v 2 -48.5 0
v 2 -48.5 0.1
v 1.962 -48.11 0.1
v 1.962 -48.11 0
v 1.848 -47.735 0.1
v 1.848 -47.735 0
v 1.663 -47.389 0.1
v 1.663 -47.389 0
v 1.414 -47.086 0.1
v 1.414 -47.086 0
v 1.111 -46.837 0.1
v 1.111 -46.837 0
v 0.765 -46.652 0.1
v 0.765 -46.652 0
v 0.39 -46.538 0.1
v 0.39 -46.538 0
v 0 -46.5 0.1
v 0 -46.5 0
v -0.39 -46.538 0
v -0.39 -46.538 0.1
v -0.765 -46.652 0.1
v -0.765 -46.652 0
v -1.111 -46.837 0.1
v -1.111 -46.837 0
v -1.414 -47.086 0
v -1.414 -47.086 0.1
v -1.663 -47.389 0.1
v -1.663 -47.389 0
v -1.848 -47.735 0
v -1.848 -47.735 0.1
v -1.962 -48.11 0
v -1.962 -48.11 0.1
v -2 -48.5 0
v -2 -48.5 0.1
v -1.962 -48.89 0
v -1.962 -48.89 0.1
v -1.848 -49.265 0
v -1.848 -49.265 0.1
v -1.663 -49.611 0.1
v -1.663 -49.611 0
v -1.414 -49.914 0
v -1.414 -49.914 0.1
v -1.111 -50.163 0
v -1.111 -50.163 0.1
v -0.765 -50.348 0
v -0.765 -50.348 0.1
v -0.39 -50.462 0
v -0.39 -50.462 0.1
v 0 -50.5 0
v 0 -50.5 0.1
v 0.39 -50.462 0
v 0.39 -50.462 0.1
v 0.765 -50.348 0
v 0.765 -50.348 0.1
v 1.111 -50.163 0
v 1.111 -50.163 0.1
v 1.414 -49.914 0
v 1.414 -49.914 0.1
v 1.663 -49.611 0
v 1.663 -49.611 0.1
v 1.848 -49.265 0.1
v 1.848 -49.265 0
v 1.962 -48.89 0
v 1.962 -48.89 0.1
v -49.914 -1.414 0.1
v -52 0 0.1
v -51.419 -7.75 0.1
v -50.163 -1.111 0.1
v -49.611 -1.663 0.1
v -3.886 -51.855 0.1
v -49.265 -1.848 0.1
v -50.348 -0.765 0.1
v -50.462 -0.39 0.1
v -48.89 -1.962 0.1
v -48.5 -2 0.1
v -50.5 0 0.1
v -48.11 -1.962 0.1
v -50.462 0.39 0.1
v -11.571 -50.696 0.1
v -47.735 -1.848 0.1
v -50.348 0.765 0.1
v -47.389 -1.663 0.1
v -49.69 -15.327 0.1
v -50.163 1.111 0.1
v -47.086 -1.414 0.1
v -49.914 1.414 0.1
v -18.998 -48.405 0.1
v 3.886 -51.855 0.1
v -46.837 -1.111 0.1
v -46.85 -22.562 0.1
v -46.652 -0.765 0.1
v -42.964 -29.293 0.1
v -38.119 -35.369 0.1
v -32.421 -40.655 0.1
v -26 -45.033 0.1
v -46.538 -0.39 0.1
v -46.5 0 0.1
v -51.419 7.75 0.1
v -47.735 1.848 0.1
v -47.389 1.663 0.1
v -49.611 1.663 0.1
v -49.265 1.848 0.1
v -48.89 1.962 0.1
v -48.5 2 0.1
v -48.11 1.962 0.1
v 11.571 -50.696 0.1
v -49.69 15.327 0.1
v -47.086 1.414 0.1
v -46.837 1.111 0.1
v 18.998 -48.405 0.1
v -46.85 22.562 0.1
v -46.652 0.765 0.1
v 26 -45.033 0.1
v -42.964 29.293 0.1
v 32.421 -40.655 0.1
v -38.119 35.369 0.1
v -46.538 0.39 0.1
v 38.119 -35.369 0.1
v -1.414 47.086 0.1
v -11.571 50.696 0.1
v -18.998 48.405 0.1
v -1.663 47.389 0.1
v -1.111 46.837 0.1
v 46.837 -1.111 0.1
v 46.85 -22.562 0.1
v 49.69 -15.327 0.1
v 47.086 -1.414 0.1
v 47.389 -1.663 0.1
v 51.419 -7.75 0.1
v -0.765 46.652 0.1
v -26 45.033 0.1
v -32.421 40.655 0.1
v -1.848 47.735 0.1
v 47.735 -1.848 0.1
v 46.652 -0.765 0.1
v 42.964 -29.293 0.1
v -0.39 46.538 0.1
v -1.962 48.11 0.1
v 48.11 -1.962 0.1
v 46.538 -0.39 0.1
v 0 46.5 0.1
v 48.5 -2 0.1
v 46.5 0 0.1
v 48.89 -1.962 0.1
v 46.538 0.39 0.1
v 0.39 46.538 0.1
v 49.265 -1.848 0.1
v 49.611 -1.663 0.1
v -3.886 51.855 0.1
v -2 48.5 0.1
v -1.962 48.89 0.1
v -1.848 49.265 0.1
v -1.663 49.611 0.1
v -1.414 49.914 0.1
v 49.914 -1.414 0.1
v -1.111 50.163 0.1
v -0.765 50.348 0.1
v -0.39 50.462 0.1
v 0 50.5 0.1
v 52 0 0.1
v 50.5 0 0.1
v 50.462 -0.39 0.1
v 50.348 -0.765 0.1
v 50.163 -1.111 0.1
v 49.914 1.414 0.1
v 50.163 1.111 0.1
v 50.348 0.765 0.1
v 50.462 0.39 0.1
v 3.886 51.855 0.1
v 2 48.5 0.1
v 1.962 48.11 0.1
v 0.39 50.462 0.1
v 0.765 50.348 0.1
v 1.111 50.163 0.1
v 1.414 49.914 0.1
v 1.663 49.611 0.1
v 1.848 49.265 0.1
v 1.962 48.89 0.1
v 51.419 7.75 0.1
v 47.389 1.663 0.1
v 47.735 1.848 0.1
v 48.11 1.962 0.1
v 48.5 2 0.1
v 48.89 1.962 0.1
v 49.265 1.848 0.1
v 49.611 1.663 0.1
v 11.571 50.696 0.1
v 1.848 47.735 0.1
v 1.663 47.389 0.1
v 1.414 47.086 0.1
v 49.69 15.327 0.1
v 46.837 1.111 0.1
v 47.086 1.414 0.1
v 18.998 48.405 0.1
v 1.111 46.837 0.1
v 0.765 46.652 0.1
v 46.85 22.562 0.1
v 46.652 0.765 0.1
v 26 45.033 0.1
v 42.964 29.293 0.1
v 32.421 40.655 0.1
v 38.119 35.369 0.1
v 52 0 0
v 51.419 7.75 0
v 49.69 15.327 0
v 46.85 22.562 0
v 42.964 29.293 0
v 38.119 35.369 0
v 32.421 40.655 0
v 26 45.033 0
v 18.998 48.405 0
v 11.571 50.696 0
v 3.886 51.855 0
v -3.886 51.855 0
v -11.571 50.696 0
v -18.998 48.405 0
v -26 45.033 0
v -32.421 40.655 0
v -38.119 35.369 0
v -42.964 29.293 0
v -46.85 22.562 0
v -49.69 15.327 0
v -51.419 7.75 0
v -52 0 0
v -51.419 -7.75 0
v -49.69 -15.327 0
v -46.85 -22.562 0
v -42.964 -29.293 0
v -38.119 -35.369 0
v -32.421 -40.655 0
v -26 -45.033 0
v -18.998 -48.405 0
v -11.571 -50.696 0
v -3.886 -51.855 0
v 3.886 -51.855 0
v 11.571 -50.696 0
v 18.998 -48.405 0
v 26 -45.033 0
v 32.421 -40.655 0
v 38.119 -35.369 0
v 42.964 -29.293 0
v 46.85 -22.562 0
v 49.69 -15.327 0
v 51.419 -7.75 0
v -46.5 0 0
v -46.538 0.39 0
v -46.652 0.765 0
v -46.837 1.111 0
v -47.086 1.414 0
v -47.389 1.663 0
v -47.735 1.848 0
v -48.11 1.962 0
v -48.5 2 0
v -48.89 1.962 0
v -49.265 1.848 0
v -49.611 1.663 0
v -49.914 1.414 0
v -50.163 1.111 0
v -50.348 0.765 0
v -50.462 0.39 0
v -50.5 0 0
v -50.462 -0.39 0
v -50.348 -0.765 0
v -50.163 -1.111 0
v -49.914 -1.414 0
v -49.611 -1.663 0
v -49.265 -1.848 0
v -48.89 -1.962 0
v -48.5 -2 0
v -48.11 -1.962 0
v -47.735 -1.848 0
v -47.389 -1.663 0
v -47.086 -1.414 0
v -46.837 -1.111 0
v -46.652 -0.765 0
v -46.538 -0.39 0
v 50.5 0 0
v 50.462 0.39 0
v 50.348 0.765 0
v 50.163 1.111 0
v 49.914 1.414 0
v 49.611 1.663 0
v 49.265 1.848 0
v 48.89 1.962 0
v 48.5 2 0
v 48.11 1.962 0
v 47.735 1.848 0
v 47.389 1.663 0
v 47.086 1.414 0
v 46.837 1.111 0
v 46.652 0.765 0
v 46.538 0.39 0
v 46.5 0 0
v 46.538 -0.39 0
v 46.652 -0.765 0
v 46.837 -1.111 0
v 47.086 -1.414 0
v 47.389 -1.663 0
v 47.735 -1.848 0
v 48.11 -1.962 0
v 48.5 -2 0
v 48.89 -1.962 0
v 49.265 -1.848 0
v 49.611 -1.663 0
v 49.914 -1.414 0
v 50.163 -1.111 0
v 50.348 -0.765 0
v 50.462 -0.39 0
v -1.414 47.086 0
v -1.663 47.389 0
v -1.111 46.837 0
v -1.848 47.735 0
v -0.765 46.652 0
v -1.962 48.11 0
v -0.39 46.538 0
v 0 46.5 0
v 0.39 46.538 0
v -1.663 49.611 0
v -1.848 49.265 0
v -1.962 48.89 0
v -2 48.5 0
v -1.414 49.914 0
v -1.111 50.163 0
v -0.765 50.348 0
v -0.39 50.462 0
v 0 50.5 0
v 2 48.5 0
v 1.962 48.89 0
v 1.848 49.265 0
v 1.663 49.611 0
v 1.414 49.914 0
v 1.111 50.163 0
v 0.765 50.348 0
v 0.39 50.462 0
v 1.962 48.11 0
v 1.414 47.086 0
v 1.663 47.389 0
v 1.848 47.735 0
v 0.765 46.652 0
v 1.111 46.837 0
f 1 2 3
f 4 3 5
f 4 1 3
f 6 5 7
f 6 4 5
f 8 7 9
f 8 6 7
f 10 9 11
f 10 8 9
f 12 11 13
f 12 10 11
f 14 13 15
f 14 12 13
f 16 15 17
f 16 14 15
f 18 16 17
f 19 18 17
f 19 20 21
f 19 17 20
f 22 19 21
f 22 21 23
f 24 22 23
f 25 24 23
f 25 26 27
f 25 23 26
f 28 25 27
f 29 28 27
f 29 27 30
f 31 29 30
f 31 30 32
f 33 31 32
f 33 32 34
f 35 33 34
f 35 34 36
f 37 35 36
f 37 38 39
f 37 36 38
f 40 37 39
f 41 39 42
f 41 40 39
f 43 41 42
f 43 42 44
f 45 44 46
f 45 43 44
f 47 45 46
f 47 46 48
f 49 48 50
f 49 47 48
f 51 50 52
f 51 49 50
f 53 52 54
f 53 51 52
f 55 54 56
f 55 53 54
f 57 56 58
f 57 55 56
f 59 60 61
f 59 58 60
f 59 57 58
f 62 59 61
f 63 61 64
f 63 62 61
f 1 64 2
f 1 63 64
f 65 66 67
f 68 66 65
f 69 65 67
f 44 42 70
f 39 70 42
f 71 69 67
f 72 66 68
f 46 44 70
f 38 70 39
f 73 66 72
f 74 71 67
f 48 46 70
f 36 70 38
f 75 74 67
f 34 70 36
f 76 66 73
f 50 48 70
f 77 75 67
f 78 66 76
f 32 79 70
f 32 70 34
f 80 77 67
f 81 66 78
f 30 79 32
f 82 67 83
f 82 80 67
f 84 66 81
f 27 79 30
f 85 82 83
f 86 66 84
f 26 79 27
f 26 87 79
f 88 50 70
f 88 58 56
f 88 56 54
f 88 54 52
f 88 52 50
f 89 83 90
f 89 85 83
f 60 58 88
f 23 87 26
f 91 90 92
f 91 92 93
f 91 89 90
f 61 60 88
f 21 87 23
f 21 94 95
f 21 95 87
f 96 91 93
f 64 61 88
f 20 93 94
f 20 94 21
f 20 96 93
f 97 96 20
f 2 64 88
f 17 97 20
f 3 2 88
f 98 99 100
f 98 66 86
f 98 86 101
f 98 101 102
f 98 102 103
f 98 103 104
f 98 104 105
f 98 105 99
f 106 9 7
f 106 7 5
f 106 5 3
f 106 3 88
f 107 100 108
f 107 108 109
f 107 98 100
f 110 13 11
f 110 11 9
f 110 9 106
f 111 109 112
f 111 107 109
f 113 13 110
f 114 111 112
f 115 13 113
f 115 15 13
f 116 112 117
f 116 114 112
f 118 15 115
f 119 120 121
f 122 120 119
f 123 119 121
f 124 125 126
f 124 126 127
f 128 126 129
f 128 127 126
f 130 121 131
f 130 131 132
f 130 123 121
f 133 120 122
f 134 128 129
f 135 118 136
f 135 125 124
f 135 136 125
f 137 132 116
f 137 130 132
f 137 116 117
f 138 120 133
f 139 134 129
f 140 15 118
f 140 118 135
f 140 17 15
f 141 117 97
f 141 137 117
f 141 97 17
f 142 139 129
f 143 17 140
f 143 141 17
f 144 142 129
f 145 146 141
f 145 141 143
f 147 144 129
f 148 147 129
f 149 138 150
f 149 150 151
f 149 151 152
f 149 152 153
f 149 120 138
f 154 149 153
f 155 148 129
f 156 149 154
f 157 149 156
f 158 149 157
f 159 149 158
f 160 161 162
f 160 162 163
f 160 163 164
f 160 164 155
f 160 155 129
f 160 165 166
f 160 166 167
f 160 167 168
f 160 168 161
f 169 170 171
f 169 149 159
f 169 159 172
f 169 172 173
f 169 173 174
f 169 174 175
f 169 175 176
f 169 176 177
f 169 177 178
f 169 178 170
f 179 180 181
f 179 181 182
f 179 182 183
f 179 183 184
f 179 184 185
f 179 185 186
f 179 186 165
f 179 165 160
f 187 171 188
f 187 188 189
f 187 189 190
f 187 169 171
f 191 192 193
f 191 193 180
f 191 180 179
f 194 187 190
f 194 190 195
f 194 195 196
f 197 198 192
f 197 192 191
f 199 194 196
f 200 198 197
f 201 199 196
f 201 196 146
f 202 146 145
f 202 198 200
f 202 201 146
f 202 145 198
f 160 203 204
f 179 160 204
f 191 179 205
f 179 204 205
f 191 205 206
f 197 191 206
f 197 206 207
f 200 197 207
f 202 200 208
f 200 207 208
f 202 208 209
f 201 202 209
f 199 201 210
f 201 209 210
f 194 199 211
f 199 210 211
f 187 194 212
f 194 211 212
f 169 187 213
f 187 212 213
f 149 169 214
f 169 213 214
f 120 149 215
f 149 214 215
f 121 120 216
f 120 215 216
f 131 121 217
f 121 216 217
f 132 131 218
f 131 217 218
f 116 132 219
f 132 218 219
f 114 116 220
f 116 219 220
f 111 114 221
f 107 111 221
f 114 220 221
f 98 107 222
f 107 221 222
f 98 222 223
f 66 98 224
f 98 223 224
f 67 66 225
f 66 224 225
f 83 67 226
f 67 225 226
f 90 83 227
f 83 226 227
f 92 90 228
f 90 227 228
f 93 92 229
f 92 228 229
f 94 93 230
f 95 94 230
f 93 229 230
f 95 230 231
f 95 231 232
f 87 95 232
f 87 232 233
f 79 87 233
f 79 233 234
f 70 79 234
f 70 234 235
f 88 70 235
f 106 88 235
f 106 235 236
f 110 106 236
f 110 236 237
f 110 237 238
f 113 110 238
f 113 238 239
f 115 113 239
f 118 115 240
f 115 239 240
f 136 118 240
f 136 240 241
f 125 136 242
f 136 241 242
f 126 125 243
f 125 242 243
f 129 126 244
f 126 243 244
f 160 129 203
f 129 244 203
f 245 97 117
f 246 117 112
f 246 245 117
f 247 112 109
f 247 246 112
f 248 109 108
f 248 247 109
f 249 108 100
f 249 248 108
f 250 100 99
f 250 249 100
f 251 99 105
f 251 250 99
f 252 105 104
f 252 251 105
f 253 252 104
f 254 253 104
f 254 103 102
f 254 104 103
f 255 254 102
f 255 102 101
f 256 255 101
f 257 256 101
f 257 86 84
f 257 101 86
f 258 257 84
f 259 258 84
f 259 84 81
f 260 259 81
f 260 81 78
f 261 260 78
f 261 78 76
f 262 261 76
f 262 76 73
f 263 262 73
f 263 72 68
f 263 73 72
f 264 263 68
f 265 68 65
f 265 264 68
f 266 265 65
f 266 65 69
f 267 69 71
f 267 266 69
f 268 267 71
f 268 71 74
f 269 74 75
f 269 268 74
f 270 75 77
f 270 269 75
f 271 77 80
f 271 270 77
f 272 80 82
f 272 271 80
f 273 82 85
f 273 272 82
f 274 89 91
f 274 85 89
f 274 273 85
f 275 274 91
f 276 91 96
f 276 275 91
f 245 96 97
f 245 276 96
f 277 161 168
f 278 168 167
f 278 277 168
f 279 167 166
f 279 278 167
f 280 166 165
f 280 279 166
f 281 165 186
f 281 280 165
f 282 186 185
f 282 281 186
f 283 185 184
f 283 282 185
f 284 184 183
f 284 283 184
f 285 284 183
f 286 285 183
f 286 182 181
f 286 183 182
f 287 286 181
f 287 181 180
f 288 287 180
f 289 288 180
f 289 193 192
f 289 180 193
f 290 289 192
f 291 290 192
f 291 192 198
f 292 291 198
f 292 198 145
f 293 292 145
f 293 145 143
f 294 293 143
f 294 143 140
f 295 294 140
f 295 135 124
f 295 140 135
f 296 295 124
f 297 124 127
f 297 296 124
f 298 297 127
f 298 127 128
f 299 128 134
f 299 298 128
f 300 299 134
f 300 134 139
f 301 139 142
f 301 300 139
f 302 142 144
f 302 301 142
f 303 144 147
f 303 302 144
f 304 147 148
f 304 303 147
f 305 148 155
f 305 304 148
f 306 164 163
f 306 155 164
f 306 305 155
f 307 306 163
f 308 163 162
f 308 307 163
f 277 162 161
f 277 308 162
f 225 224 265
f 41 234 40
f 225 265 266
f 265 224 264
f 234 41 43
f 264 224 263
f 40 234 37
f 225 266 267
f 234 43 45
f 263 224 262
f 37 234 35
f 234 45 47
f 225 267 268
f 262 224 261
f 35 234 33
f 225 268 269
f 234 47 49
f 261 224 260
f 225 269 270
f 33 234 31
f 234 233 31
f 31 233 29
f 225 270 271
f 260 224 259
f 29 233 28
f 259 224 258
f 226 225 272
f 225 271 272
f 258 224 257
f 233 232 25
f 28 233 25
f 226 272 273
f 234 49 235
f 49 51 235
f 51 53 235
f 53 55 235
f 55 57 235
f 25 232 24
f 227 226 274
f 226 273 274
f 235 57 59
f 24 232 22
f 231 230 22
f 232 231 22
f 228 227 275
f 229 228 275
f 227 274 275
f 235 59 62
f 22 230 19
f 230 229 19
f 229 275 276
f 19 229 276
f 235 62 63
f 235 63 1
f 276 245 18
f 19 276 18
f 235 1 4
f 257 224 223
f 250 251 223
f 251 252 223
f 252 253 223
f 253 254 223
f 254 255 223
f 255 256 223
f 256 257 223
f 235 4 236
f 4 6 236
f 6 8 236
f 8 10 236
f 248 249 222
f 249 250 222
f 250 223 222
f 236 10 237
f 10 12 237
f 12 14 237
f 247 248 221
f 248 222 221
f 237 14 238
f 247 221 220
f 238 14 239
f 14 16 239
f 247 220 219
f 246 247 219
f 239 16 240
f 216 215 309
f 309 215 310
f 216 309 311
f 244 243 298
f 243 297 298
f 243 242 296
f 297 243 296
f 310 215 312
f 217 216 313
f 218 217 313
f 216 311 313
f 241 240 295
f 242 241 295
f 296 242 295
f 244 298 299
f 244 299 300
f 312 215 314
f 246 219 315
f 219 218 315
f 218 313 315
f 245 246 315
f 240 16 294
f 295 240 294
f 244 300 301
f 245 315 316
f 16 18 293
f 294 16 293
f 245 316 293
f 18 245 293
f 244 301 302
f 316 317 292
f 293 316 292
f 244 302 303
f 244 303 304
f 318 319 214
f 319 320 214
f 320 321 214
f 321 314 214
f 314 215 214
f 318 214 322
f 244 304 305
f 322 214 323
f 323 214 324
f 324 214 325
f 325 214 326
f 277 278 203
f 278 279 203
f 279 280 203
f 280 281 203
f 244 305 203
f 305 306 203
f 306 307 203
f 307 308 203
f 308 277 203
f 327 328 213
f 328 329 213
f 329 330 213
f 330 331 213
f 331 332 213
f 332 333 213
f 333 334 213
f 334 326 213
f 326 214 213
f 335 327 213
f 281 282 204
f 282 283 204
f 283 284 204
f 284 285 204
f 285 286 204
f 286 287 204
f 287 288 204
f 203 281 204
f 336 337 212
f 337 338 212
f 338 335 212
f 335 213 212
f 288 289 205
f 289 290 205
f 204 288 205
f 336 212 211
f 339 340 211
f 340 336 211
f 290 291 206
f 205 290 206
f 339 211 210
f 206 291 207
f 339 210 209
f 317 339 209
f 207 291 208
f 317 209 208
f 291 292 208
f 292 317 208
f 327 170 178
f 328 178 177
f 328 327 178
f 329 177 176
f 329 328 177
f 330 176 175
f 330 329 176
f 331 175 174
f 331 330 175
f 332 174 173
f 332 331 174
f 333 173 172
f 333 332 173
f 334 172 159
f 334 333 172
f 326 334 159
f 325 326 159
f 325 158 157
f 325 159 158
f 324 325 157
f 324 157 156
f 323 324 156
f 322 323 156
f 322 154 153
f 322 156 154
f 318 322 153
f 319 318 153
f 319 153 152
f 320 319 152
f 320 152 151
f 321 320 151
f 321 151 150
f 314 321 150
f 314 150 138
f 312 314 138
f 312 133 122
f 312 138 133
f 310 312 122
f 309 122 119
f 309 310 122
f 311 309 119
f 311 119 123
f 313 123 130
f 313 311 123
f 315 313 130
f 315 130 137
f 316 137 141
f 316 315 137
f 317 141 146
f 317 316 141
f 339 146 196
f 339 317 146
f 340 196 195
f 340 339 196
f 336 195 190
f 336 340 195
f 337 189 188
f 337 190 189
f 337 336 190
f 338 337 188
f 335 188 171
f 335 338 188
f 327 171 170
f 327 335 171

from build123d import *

# Parameters (mm, degrees)
F0_R     = 52
F1_DEPTH = 0.1
F2_R     = 2
F3_DEPTH = 0.101


with BuildPart() as f1:
    # F0 (on Top) → F1 (new body)
    with BuildSketch(Plane.XY):
        Circle(F0_R)
    extrude(amount=F1_DEPTH)

    # F2 (on Top) → F3 (cut, through all)
    with BuildSketch(Plane.XY):
        with Locations((48.5, 0)):
            Circle(F2_R)
        with Locations((0, 48.5)):
            Circle(F2_R)
        with Locations((-48.5, 0)):
            Circle(F2_R)
        with Locations((0, -48.5)):
            Circle(F2_R)
    extrude(amount=F3_DEPTH, mode=Mode.SUBTRACT)


solid = f1.part
